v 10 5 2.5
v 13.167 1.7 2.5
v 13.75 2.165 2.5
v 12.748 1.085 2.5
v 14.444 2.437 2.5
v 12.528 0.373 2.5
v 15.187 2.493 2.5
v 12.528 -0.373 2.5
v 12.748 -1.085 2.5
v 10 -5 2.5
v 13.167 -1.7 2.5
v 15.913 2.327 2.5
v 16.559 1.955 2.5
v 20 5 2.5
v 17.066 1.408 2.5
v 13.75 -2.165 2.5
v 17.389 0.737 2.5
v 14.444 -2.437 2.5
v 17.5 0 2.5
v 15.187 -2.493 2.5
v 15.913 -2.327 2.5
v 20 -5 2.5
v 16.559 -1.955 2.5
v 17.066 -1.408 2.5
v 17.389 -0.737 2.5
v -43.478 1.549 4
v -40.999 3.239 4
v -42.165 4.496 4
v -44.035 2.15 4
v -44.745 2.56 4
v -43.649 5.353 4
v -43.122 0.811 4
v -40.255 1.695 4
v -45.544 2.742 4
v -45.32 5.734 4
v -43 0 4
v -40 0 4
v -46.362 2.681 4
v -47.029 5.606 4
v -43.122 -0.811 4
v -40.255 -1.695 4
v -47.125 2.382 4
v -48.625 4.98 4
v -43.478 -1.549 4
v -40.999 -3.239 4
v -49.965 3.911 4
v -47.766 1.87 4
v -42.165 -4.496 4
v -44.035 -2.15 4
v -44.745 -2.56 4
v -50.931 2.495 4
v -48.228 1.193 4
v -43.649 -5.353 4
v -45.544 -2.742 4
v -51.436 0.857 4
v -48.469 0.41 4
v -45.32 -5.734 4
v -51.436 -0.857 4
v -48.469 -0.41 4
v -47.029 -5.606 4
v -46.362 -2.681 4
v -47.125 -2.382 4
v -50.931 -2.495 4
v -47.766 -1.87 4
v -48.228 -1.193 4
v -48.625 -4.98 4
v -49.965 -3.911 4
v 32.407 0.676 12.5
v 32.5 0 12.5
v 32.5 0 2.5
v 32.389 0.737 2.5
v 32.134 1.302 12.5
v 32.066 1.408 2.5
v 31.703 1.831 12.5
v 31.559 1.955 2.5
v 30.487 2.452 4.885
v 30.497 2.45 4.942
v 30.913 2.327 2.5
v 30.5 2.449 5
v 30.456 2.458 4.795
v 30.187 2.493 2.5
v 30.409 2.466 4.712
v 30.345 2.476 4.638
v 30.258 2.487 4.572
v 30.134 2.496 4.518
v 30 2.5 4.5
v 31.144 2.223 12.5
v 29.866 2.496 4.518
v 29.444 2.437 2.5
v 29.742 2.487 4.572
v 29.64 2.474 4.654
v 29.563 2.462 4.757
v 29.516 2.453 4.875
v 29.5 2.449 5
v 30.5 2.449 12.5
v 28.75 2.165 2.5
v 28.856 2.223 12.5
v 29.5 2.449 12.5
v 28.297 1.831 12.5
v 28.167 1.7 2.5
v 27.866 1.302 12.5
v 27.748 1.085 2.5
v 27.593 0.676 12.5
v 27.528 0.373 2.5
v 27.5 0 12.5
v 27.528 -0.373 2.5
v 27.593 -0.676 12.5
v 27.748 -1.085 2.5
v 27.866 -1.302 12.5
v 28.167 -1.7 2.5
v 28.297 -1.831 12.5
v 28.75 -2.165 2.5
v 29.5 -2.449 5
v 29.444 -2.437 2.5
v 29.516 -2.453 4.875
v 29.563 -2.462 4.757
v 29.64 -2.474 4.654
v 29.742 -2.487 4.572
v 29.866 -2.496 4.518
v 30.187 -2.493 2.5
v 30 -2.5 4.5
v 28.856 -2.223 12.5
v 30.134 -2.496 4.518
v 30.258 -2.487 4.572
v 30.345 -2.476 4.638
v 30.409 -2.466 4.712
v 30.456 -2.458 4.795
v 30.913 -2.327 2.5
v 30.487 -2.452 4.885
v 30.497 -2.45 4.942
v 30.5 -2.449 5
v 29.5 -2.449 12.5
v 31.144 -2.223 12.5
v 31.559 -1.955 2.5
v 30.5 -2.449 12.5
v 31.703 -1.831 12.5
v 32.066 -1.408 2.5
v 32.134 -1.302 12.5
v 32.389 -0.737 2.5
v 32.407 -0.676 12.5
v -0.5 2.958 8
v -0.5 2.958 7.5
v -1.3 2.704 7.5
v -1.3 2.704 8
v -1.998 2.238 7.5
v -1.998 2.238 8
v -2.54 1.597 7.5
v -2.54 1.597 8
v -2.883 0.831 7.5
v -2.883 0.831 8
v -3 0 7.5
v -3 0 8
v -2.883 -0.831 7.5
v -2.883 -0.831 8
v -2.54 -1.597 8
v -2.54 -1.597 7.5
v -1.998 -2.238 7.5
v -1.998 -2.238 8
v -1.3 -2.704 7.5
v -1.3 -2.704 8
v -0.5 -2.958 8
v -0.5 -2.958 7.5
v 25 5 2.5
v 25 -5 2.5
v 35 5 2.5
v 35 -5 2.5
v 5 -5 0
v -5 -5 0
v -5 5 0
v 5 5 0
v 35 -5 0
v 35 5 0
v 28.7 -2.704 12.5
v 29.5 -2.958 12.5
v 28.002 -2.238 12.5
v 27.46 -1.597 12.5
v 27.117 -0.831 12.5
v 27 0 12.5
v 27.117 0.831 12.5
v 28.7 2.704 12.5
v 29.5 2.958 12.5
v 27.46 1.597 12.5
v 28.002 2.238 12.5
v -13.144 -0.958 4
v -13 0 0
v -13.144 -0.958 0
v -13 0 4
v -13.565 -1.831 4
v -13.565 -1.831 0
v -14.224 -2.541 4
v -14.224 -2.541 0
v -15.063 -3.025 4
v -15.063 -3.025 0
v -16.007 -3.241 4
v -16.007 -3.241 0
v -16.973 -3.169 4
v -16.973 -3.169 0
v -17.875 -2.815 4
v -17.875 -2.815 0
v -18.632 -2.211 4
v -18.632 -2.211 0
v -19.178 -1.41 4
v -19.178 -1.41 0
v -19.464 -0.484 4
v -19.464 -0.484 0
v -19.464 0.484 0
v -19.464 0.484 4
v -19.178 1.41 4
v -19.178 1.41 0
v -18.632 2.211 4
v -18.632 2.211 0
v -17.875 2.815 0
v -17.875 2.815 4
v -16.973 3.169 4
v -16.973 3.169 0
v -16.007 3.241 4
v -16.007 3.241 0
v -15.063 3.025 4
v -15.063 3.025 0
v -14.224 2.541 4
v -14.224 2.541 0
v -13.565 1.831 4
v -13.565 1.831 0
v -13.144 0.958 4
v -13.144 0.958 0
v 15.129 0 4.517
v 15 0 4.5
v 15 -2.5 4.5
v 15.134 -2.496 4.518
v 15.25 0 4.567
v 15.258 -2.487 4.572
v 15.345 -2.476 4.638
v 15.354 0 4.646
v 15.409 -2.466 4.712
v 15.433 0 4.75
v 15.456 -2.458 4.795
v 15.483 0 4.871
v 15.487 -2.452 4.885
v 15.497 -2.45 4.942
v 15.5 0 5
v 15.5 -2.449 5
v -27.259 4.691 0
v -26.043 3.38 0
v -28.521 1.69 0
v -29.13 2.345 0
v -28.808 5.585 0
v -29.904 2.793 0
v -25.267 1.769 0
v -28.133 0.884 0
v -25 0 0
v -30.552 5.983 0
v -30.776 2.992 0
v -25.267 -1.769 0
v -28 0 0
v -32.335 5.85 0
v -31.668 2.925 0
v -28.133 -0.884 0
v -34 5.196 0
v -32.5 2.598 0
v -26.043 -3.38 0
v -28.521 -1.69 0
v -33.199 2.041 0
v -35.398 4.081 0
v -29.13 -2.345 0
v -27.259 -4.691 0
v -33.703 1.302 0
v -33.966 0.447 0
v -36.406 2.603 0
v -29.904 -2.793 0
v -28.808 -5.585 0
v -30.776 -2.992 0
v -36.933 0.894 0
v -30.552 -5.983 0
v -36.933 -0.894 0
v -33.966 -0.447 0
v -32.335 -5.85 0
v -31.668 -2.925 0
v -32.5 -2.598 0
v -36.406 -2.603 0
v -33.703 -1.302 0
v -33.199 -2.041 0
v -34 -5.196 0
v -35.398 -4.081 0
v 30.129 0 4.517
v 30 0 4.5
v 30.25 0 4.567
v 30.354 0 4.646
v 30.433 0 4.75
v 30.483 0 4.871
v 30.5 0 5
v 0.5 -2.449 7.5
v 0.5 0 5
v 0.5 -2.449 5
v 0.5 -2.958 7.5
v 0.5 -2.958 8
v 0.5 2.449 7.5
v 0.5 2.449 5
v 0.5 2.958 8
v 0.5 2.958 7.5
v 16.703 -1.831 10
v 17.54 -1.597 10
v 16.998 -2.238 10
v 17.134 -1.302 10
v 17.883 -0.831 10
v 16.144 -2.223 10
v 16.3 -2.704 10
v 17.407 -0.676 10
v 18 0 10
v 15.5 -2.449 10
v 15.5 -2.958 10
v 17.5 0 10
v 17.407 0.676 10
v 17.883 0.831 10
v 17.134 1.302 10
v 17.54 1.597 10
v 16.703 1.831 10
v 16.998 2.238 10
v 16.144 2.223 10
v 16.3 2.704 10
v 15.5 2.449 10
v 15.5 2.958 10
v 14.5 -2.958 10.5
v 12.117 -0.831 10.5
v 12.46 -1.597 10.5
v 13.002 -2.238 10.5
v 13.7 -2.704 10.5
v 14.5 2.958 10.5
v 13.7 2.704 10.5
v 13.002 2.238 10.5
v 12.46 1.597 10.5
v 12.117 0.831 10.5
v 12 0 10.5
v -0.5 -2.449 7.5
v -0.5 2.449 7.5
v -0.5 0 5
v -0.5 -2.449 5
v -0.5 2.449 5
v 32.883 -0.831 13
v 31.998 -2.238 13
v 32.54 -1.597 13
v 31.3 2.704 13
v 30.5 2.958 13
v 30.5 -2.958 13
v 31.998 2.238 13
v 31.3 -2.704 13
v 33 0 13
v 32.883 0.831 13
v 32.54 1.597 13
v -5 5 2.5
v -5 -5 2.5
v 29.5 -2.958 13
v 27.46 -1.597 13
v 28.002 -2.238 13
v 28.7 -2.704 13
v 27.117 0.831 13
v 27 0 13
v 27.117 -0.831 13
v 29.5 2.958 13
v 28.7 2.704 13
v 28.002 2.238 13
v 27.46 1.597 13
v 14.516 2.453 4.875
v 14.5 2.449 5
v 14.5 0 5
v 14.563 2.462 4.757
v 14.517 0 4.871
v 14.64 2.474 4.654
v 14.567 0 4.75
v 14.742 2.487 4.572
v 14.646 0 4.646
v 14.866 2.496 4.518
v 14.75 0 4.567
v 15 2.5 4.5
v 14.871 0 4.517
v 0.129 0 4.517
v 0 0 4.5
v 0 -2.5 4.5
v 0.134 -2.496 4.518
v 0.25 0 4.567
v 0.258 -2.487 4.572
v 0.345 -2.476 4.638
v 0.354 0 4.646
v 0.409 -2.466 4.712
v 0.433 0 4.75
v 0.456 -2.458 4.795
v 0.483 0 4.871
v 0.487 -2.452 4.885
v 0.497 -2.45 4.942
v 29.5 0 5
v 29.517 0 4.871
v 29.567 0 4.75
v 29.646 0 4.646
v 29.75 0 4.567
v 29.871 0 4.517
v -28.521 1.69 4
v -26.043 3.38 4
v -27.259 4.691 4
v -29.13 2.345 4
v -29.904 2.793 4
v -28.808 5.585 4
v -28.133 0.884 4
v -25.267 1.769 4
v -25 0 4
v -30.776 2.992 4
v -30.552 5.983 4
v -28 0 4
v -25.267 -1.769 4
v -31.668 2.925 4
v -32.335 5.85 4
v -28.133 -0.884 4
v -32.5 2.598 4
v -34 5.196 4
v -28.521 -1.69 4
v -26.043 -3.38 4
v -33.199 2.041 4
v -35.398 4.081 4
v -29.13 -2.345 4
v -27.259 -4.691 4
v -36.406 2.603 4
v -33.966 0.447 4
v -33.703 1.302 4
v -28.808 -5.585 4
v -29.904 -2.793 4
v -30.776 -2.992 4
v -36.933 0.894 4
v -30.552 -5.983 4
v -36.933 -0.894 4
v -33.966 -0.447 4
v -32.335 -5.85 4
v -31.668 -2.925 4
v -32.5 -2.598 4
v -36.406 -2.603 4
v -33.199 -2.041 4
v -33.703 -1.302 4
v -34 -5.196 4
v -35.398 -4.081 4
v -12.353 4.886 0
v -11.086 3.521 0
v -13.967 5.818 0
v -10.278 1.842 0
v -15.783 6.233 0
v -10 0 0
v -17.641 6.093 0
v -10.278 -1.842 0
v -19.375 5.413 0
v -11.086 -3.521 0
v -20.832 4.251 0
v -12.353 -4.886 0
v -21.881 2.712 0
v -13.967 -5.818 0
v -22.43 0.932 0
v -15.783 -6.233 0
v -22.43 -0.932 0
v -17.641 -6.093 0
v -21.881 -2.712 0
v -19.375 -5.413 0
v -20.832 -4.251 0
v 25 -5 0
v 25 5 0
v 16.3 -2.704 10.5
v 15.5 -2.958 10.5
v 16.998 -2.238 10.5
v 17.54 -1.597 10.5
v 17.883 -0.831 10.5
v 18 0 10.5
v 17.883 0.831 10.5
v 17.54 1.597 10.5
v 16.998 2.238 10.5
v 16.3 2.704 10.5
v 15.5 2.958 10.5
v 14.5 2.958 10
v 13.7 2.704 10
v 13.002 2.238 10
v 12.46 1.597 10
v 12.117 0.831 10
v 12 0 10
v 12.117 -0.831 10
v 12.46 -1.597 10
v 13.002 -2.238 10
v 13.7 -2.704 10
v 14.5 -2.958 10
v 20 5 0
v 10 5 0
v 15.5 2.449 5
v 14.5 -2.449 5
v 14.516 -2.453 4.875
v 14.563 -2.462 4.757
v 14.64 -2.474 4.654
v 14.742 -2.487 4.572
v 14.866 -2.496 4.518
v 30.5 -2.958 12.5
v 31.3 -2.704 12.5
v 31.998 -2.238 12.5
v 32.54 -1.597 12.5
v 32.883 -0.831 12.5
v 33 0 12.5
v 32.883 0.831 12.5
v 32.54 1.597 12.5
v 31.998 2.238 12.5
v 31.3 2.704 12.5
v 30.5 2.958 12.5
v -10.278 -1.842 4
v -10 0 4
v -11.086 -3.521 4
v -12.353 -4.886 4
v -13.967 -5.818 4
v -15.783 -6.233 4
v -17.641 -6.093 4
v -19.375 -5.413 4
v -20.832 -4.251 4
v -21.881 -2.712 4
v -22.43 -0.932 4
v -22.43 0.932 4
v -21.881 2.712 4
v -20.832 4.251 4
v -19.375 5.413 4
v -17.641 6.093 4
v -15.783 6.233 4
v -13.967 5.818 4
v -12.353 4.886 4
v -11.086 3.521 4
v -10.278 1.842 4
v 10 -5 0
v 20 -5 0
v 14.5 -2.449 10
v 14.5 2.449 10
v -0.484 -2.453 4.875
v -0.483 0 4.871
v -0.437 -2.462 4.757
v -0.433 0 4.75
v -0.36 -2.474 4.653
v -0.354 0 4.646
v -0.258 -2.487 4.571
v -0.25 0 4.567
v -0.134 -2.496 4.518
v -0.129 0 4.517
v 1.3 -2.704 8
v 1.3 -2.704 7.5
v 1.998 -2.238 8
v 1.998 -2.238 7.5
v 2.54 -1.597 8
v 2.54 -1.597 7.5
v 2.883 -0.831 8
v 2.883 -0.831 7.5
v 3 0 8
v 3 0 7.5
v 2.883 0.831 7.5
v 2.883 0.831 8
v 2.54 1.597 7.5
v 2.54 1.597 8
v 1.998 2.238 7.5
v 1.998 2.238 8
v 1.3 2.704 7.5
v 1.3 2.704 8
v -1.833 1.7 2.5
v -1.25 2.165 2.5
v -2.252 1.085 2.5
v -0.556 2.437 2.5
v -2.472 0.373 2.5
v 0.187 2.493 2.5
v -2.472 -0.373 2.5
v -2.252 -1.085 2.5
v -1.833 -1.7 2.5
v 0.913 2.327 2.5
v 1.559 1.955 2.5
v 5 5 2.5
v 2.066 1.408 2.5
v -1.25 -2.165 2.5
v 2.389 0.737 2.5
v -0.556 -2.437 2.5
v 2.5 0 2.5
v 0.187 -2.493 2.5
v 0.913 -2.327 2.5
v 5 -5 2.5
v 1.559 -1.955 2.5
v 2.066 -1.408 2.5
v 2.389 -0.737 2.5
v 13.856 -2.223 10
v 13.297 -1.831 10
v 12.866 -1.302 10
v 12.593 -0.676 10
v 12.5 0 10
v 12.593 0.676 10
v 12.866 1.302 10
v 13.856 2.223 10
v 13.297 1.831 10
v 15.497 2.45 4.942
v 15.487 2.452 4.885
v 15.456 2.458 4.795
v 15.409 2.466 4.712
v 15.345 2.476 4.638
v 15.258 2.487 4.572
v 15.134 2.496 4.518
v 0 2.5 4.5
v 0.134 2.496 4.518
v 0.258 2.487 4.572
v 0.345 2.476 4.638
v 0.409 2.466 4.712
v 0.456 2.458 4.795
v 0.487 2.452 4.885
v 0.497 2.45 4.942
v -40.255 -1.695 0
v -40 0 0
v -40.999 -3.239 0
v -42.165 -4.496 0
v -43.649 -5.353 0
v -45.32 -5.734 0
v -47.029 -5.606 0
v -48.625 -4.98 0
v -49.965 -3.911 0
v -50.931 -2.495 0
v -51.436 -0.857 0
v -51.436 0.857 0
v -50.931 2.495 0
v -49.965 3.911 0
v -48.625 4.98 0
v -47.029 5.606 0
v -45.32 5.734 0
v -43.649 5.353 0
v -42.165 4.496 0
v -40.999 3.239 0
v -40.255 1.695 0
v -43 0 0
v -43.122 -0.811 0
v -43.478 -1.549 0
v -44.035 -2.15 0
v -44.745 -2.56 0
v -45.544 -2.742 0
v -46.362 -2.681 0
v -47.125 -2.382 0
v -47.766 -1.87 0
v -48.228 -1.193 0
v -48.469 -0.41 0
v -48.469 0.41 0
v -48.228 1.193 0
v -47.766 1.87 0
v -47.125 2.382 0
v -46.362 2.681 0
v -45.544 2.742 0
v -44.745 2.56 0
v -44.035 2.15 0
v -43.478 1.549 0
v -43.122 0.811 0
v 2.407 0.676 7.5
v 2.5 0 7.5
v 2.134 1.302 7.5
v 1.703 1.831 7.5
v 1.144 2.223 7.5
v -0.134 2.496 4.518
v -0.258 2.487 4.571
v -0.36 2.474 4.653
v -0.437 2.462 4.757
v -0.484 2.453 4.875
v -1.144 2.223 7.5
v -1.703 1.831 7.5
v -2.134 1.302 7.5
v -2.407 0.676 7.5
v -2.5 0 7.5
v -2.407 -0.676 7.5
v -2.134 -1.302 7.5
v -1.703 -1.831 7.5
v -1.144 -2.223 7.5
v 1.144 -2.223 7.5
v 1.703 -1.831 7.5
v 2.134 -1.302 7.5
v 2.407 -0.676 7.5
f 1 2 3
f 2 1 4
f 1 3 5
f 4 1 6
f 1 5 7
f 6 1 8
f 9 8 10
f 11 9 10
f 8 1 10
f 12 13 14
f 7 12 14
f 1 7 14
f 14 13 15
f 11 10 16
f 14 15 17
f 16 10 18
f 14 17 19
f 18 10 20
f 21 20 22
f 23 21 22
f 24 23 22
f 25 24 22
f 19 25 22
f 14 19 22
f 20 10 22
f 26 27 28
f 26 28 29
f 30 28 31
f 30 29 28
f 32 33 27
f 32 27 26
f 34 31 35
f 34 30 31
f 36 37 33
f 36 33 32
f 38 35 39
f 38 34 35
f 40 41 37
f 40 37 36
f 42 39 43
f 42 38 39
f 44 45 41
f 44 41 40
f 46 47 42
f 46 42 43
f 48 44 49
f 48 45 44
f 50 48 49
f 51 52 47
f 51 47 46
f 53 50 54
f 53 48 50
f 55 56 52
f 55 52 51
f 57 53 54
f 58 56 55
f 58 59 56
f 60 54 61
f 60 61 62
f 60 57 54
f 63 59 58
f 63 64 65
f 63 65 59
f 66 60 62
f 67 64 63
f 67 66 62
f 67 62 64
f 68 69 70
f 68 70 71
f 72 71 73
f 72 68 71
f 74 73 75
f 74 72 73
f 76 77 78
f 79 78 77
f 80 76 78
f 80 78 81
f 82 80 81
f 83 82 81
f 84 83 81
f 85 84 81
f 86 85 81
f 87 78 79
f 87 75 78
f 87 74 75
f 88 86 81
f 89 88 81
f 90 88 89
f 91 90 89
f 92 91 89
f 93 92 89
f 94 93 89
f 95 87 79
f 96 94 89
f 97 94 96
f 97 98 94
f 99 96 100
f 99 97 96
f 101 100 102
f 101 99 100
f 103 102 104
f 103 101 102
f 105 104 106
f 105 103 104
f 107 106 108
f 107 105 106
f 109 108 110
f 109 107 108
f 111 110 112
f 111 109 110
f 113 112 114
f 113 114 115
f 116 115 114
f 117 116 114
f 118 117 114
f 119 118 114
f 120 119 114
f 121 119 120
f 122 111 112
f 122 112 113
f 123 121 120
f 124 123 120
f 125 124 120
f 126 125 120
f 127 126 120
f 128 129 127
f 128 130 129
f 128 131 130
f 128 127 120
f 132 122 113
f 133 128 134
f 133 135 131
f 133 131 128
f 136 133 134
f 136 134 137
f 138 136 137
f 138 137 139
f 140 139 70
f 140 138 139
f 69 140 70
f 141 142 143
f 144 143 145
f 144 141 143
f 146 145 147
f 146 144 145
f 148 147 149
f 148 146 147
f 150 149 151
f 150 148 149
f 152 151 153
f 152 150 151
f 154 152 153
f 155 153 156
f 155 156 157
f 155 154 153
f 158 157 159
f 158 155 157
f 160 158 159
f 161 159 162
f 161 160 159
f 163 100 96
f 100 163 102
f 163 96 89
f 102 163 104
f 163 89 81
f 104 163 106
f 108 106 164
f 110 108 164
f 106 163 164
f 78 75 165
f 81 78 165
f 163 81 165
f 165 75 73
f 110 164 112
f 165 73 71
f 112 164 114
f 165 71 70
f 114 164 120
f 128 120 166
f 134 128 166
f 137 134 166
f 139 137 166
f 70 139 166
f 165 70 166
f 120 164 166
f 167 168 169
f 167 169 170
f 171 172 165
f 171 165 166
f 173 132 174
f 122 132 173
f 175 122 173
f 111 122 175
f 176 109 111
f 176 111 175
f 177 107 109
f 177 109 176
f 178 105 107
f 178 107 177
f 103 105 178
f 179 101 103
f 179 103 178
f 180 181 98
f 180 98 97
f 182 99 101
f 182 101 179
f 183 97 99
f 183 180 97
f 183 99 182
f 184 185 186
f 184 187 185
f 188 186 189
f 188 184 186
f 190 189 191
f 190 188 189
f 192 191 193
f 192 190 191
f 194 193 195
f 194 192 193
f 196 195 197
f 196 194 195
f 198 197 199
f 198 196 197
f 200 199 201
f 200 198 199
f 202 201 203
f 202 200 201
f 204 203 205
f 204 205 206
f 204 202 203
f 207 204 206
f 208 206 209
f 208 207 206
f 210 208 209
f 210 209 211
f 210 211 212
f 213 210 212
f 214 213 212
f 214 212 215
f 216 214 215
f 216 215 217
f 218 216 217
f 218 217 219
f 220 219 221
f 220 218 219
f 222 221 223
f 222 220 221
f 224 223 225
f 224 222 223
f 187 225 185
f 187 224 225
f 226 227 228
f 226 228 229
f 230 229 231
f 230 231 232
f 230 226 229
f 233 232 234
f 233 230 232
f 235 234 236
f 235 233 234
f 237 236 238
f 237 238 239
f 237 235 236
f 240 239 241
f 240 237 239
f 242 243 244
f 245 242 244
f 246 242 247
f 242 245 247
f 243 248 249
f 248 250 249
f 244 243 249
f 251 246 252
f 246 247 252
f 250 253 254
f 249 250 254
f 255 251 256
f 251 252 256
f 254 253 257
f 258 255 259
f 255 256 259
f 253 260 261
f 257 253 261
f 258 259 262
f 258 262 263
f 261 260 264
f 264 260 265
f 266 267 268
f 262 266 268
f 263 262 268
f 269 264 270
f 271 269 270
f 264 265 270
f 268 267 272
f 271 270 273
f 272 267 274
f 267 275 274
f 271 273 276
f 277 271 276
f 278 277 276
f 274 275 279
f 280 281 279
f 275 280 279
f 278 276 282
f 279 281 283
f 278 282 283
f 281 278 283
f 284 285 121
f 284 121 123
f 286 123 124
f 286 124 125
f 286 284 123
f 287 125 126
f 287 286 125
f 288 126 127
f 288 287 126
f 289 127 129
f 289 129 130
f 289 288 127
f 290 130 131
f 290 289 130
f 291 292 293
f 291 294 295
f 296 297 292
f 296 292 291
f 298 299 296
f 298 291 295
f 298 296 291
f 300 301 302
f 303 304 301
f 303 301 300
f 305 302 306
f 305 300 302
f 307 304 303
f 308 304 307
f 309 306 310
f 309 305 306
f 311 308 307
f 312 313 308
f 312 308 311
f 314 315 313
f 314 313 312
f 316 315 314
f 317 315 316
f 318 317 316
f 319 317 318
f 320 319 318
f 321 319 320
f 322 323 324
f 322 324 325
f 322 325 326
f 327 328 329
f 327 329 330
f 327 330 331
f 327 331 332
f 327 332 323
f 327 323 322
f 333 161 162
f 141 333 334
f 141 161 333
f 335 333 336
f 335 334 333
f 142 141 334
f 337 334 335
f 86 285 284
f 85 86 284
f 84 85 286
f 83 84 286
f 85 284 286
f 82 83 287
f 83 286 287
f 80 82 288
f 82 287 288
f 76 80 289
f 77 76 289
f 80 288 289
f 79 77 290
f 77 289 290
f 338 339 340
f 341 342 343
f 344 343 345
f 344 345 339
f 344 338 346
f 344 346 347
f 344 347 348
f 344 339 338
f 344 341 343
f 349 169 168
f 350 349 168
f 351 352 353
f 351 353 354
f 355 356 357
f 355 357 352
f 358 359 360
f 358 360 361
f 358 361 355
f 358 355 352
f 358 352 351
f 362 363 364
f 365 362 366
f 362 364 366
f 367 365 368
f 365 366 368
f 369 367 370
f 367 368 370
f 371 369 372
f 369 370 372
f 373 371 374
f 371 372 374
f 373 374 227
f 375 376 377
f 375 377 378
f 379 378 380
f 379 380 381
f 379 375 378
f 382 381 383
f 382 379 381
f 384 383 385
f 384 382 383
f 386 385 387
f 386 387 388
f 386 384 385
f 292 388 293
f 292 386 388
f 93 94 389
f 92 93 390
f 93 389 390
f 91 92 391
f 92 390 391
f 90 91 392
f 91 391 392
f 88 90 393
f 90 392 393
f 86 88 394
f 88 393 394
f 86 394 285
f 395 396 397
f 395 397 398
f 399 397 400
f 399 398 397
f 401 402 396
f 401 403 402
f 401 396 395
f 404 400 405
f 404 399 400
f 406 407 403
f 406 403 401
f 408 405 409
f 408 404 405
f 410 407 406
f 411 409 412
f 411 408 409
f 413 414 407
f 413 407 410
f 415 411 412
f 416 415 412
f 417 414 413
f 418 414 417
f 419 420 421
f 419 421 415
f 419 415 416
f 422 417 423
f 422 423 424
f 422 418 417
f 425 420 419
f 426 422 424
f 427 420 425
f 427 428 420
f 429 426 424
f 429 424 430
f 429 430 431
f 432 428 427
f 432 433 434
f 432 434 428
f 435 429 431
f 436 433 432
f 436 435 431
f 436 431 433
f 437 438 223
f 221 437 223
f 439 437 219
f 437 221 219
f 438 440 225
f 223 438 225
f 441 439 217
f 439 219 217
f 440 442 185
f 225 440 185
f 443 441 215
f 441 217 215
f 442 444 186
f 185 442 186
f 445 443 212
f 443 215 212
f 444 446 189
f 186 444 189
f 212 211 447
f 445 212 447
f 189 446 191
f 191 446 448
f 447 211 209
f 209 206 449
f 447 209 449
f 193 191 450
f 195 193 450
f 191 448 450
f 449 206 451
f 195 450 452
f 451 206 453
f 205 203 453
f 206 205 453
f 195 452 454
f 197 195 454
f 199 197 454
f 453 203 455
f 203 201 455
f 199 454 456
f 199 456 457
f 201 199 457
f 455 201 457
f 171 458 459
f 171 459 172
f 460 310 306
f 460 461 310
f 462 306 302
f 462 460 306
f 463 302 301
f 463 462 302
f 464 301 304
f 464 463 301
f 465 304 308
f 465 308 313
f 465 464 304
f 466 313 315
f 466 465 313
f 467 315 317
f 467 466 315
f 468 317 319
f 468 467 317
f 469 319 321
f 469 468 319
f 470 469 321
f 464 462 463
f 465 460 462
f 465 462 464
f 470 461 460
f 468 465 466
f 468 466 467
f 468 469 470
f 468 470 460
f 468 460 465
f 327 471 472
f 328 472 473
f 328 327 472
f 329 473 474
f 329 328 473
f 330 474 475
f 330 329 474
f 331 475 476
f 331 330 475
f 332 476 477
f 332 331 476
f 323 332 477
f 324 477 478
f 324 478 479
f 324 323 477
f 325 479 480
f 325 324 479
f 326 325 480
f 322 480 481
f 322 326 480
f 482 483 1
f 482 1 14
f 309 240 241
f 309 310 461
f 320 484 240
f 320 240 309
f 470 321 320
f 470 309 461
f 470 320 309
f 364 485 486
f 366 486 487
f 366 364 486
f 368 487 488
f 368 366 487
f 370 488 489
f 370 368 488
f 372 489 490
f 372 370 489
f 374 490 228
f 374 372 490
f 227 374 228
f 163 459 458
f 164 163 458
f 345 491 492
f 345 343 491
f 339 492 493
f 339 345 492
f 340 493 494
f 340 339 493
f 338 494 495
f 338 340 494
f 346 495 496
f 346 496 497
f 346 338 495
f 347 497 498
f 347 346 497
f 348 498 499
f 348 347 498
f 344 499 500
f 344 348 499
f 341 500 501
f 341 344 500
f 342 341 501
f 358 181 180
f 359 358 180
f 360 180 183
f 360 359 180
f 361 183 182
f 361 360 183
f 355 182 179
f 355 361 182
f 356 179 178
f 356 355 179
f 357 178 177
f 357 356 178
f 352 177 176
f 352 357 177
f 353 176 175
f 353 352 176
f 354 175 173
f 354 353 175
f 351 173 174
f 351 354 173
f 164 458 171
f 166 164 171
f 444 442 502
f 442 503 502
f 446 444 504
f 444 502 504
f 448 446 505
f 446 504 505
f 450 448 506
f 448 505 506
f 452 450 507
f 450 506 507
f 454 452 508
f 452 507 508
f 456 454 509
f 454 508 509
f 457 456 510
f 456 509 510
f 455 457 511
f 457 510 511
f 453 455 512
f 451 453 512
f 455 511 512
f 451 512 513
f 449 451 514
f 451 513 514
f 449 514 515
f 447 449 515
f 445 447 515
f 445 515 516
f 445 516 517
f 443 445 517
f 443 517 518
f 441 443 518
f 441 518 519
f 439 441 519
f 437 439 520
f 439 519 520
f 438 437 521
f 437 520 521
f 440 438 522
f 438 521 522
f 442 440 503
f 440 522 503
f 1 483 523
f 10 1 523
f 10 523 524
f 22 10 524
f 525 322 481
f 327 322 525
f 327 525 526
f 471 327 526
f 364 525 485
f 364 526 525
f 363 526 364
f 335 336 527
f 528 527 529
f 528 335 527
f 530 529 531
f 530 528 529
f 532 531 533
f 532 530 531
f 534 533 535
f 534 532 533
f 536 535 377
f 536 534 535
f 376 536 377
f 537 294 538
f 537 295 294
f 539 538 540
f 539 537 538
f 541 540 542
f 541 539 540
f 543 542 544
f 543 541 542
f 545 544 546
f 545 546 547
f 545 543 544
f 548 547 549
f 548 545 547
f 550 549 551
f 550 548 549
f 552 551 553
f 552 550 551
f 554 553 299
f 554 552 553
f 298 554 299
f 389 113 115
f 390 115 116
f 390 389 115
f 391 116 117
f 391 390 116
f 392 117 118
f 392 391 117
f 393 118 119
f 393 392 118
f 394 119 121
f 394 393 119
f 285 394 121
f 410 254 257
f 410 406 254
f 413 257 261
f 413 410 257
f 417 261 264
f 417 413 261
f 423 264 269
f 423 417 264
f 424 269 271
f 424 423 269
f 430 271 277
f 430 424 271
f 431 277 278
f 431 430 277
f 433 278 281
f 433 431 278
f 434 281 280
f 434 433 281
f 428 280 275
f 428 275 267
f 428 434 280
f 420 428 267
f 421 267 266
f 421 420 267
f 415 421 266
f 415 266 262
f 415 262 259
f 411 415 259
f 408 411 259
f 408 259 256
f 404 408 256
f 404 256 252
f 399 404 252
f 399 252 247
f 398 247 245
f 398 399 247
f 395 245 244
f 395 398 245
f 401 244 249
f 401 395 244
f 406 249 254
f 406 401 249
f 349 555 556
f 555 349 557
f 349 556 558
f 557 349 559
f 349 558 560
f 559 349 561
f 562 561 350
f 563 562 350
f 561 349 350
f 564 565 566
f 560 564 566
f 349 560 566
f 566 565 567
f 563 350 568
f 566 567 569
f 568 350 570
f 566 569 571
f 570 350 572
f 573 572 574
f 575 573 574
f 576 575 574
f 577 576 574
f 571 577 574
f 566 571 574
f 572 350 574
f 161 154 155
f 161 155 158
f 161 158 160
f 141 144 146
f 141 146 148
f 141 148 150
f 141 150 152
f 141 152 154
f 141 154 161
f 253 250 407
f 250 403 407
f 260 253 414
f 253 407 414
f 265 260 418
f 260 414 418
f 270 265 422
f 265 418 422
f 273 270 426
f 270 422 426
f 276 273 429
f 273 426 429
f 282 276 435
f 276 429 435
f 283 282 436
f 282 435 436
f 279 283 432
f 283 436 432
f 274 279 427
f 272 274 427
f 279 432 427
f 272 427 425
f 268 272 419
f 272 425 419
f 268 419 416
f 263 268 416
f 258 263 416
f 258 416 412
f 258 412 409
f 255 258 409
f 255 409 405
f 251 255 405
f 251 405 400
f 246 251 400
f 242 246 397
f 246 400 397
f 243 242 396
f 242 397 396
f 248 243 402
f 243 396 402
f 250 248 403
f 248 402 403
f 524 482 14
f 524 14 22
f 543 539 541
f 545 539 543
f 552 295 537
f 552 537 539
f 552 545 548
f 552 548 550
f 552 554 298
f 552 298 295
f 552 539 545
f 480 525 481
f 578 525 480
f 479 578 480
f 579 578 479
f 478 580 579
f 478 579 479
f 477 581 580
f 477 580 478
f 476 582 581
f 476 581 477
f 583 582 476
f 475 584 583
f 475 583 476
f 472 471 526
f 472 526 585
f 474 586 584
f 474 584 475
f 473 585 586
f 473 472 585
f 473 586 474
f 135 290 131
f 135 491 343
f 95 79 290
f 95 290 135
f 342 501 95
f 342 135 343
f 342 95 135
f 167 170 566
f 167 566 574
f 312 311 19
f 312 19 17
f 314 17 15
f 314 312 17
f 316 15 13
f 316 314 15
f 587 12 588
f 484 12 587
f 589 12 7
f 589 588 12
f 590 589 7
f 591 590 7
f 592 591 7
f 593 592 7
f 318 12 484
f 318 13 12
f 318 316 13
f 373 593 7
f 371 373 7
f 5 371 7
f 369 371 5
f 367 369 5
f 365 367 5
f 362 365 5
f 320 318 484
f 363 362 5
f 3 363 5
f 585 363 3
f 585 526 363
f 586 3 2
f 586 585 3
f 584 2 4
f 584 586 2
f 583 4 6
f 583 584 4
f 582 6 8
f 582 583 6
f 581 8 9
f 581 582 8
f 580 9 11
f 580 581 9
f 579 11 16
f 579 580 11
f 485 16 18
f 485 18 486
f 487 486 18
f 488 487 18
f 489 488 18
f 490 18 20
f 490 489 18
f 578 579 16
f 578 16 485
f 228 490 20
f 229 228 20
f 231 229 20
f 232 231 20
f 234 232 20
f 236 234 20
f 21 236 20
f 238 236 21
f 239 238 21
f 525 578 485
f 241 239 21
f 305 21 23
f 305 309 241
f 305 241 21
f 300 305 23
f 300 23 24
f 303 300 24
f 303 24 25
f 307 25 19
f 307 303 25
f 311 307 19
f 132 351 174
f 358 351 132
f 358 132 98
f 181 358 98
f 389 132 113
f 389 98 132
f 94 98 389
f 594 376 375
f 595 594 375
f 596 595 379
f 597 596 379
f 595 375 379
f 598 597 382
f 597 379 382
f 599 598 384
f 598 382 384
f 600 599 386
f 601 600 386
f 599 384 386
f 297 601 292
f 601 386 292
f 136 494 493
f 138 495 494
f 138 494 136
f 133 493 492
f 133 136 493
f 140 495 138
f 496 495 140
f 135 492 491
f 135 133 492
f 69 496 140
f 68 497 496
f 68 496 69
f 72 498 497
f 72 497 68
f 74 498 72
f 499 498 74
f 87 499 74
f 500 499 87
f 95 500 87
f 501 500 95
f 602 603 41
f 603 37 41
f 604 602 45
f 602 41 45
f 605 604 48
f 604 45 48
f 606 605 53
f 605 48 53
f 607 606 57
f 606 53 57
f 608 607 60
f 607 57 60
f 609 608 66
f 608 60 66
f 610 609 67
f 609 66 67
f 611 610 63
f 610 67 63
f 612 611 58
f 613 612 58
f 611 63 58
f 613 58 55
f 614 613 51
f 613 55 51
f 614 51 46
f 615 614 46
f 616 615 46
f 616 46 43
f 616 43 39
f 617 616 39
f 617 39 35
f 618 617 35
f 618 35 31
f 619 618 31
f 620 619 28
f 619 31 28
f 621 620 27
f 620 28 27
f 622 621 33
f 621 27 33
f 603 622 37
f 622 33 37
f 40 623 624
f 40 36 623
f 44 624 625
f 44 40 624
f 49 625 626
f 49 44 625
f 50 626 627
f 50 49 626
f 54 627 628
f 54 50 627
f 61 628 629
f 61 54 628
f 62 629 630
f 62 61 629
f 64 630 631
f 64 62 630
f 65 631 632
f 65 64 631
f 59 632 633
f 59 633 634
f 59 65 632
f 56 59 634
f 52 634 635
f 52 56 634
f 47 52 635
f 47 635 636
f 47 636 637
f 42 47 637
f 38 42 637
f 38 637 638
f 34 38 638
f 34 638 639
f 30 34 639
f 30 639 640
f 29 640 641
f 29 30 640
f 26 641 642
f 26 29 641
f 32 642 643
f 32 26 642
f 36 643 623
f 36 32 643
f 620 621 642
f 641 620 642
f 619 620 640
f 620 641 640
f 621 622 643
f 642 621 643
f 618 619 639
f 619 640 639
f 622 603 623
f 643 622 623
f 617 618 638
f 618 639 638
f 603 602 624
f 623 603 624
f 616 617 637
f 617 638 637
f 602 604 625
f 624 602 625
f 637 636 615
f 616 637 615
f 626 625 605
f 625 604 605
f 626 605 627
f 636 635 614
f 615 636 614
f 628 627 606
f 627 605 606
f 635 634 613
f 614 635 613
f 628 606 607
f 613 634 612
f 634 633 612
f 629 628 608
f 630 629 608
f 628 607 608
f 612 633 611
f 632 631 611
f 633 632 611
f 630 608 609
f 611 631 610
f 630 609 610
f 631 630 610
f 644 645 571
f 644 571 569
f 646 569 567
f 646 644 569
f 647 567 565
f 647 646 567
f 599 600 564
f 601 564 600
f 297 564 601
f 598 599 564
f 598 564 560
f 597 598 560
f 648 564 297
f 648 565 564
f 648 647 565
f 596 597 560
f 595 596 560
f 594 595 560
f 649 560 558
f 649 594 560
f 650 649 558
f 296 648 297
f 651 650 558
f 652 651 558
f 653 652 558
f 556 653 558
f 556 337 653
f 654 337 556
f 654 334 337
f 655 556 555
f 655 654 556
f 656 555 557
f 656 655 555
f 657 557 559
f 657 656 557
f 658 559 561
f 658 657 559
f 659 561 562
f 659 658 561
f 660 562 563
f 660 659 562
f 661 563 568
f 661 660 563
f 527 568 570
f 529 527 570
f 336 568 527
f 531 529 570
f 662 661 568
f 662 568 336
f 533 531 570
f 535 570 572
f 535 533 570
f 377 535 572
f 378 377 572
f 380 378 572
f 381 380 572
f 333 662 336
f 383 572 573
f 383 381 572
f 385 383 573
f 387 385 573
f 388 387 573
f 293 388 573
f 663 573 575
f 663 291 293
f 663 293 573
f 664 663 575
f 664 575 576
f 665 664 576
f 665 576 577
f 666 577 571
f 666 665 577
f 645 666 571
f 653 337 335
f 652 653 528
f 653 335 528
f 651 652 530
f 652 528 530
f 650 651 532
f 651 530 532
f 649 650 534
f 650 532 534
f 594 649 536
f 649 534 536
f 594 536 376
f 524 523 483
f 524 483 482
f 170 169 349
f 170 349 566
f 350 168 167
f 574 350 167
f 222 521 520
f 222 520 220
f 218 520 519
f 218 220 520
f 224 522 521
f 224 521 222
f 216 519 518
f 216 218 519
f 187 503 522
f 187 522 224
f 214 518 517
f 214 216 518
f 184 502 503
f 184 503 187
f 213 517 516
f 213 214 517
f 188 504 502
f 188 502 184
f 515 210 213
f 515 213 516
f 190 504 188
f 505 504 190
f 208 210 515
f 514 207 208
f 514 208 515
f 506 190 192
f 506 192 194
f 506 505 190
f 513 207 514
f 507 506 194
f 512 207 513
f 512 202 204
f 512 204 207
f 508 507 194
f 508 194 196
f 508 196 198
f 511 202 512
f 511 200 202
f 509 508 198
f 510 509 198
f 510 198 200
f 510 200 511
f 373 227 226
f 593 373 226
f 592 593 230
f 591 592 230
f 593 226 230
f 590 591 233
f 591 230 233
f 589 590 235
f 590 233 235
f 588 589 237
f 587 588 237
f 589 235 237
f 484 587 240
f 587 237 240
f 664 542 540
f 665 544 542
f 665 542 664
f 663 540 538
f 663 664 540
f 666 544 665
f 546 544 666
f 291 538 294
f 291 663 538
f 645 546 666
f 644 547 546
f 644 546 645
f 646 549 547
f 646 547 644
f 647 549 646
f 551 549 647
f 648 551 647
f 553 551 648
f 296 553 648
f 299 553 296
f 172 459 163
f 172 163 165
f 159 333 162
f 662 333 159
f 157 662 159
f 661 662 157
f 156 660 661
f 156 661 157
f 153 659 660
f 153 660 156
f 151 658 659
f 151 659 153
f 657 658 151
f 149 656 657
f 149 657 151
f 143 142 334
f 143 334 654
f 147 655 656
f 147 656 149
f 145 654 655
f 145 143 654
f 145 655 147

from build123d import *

# Parameters (mm, degrees)
F5_DEPTH      = 25
F5_DEPTH_BACK = 25
F6_W          = 3
F6_H          = 4
F10_W         = 10
F10_H         = 10
F11_DEPTH     = 2.5


with BuildPart() as f1:
    # F0 (on Front) → F1 (revolve)
    with BuildSketch(Plane.XZ):
        Polygon((3, 8), (0, 8), (0, 0), (5, 0), (5, 2.5), (2.5, 2.5), (2.5, 7.5), (3, 7.5), align=None)
    revolve(axis=Axis((0, 0, 8.1081883982), (0, 0, 1)))


with BuildPart() as f2:
    # F0 (on Front) → F2 (revolve)
    with BuildSketch(Plane.XZ):
        Polygon((18, 10.5), (15, 10.5), (15, 0), (20, 0), (20, 2.5), (17.5, 2.5), (17.5, 10), (18, 10), align=None)
    revolve(axis=Axis((15, 0, 7.5201606378), (0, 0, 1)))


with BuildPart() as f3:
    # F0 (on Front) → F3 (revolve)
    with BuildSketch(Plane.XZ):
        Polygon((33, 13), (30, 13), (30, 0), (35, 0), (35, 2.5), (32.5, 2.5), (32.5, 12.5), (33, 12.5), align=None)
    revolve(axis=Axis((30, 0, 13.954574092), (0, 0, 1)))


with BuildPart() as f5_tool:
    # F4 (on Front) → F5 (new body, two sides)
    with BuildSketch(Plane.XZ) as f5_sk:
        with BuildLine():
            Line((0.5, 8), (0, 8))
            Line((0, 8), (-0.5, 8))
            Line((-0.5, 8), (-0.5, 5))
            ThreePointArc((-0.5, 5), (-0.3535533906, 4.6464466094), (0, 4.5))
            ThreePointArc((0, 4.5), (0.3535533906, 4.6464466094), (0.5, 5))
            Line((0.5, 5), (0.5, 8))
        make_face()
        with BuildLine():
            Line((15.5, 10.5), (15, 10.5))
            Line((15, 10.5), (14.5, 10.5))
            Line((14.5, 10.5), (14.5, 5))
            ThreePointArc((14.5, 5), (14.6464466094, 4.6464466094), (15, 4.5))
            ThreePointArc((15, 4.5), (15.3535533906, 4.6464466094), (15.5, 5))
            Line((15.5, 5), (15.5, 10.5))
        make_face()
        with BuildLine():
            Line((30.5, 13), (30, 13))
            Line((30, 13), (29.5, 13))
            Line((29.5, 13), (29.5, 5))
            ThreePointArc((29.5, 5), (29.6464466094, 4.6464466094), (30, 4.5))
            ThreePointArc((30, 4.5), (30.3535533906, 4.6464466094), (30.5, 5))
            Line((30.5, 5), (30.5, 13))
        make_face()
    extrude(amount=-F5_DEPTH)
    extrude(f5_sk.sketch, amount=F5_DEPTH_BACK)


with BuildPart() as f1_1:
    add(f1.part)

    # F5: cut by f5_tool
    add(f5_tool.part, mode=Mode.SUBTRACT)

    # F10 (on face) → F11 (join, through all)
    with BuildSketch(Plane(origin=(0, 0, 0), x_dir=(1, 0, 0), z_dir=(0, 0, -1))):
        Rectangle(F10_W, F10_H)
    extrude(amount=-F11_DEPTH)


with BuildPart() as f2_1:
    add(f2.part)

    # F5: cut by f5_tool
    add(f5_tool.part, mode=Mode.SUBTRACT)

    # F10 (on face) → F11, piece 2 (join, through all)
    with BuildSketch(Plane(origin=(0, 0, 0), x_dir=(1, 0, 0), z_dir=(0, 0, -1))):
        with Locations((15, 0)):
            Rectangle(F10_W, F10_H)
    extrude(amount=-F11_DEPTH)


with BuildPart() as f3_1:
    add(f3.part)

    # F5: cut by f5_tool
    add(f5_tool.part, mode=Mode.SUBTRACT)

    # F10 (on face) → F11, piece 3 (join, through all)
    with BuildSketch(Plane(origin=(0, 0, 0), x_dir=(1, 0, 0), z_dir=(0, 0, -1))):
        with Locations((30, 0)):
            Rectangle(F10_W, F10_H)
    extrude(amount=-F11_DEPTH)


with BuildPart() as f7:
    # F6 (on Front) → F7 (revolve)
    with BuildSketch(Plane.XZ):
        with Locations((-11.5, 2)):
            Rectangle(F6_W, F6_H)
    revolve(axis=Axis((-16.25, 0, 6.1969419535), (0, 0, -1)))


with BuildPart() as f8:
    # F6 (on Front) → F8 (revolve)
    with BuildSketch(Plane.XZ):
        with Locations((-26.5, 2)):
            Rectangle(F6_W, F6_H)
    revolve(axis=Axis((-31, 0, 5.8758527754), (0, 0, -1)))


with BuildPart() as f9:
    # F6 (on Front) → F9 (revolve)
    with BuildSketch(Plane.XZ):
        with Locations((-41.5, 2)):
            Rectangle(F6_W, F6_H)
    revolve(axis=Axis((-45.75, 0, 7.1673819649), (0, 0, -1)))


solid = Compound([f1_1.part, f2_1.part, f3_1.part, f7.part, f8.part, f9.part])
